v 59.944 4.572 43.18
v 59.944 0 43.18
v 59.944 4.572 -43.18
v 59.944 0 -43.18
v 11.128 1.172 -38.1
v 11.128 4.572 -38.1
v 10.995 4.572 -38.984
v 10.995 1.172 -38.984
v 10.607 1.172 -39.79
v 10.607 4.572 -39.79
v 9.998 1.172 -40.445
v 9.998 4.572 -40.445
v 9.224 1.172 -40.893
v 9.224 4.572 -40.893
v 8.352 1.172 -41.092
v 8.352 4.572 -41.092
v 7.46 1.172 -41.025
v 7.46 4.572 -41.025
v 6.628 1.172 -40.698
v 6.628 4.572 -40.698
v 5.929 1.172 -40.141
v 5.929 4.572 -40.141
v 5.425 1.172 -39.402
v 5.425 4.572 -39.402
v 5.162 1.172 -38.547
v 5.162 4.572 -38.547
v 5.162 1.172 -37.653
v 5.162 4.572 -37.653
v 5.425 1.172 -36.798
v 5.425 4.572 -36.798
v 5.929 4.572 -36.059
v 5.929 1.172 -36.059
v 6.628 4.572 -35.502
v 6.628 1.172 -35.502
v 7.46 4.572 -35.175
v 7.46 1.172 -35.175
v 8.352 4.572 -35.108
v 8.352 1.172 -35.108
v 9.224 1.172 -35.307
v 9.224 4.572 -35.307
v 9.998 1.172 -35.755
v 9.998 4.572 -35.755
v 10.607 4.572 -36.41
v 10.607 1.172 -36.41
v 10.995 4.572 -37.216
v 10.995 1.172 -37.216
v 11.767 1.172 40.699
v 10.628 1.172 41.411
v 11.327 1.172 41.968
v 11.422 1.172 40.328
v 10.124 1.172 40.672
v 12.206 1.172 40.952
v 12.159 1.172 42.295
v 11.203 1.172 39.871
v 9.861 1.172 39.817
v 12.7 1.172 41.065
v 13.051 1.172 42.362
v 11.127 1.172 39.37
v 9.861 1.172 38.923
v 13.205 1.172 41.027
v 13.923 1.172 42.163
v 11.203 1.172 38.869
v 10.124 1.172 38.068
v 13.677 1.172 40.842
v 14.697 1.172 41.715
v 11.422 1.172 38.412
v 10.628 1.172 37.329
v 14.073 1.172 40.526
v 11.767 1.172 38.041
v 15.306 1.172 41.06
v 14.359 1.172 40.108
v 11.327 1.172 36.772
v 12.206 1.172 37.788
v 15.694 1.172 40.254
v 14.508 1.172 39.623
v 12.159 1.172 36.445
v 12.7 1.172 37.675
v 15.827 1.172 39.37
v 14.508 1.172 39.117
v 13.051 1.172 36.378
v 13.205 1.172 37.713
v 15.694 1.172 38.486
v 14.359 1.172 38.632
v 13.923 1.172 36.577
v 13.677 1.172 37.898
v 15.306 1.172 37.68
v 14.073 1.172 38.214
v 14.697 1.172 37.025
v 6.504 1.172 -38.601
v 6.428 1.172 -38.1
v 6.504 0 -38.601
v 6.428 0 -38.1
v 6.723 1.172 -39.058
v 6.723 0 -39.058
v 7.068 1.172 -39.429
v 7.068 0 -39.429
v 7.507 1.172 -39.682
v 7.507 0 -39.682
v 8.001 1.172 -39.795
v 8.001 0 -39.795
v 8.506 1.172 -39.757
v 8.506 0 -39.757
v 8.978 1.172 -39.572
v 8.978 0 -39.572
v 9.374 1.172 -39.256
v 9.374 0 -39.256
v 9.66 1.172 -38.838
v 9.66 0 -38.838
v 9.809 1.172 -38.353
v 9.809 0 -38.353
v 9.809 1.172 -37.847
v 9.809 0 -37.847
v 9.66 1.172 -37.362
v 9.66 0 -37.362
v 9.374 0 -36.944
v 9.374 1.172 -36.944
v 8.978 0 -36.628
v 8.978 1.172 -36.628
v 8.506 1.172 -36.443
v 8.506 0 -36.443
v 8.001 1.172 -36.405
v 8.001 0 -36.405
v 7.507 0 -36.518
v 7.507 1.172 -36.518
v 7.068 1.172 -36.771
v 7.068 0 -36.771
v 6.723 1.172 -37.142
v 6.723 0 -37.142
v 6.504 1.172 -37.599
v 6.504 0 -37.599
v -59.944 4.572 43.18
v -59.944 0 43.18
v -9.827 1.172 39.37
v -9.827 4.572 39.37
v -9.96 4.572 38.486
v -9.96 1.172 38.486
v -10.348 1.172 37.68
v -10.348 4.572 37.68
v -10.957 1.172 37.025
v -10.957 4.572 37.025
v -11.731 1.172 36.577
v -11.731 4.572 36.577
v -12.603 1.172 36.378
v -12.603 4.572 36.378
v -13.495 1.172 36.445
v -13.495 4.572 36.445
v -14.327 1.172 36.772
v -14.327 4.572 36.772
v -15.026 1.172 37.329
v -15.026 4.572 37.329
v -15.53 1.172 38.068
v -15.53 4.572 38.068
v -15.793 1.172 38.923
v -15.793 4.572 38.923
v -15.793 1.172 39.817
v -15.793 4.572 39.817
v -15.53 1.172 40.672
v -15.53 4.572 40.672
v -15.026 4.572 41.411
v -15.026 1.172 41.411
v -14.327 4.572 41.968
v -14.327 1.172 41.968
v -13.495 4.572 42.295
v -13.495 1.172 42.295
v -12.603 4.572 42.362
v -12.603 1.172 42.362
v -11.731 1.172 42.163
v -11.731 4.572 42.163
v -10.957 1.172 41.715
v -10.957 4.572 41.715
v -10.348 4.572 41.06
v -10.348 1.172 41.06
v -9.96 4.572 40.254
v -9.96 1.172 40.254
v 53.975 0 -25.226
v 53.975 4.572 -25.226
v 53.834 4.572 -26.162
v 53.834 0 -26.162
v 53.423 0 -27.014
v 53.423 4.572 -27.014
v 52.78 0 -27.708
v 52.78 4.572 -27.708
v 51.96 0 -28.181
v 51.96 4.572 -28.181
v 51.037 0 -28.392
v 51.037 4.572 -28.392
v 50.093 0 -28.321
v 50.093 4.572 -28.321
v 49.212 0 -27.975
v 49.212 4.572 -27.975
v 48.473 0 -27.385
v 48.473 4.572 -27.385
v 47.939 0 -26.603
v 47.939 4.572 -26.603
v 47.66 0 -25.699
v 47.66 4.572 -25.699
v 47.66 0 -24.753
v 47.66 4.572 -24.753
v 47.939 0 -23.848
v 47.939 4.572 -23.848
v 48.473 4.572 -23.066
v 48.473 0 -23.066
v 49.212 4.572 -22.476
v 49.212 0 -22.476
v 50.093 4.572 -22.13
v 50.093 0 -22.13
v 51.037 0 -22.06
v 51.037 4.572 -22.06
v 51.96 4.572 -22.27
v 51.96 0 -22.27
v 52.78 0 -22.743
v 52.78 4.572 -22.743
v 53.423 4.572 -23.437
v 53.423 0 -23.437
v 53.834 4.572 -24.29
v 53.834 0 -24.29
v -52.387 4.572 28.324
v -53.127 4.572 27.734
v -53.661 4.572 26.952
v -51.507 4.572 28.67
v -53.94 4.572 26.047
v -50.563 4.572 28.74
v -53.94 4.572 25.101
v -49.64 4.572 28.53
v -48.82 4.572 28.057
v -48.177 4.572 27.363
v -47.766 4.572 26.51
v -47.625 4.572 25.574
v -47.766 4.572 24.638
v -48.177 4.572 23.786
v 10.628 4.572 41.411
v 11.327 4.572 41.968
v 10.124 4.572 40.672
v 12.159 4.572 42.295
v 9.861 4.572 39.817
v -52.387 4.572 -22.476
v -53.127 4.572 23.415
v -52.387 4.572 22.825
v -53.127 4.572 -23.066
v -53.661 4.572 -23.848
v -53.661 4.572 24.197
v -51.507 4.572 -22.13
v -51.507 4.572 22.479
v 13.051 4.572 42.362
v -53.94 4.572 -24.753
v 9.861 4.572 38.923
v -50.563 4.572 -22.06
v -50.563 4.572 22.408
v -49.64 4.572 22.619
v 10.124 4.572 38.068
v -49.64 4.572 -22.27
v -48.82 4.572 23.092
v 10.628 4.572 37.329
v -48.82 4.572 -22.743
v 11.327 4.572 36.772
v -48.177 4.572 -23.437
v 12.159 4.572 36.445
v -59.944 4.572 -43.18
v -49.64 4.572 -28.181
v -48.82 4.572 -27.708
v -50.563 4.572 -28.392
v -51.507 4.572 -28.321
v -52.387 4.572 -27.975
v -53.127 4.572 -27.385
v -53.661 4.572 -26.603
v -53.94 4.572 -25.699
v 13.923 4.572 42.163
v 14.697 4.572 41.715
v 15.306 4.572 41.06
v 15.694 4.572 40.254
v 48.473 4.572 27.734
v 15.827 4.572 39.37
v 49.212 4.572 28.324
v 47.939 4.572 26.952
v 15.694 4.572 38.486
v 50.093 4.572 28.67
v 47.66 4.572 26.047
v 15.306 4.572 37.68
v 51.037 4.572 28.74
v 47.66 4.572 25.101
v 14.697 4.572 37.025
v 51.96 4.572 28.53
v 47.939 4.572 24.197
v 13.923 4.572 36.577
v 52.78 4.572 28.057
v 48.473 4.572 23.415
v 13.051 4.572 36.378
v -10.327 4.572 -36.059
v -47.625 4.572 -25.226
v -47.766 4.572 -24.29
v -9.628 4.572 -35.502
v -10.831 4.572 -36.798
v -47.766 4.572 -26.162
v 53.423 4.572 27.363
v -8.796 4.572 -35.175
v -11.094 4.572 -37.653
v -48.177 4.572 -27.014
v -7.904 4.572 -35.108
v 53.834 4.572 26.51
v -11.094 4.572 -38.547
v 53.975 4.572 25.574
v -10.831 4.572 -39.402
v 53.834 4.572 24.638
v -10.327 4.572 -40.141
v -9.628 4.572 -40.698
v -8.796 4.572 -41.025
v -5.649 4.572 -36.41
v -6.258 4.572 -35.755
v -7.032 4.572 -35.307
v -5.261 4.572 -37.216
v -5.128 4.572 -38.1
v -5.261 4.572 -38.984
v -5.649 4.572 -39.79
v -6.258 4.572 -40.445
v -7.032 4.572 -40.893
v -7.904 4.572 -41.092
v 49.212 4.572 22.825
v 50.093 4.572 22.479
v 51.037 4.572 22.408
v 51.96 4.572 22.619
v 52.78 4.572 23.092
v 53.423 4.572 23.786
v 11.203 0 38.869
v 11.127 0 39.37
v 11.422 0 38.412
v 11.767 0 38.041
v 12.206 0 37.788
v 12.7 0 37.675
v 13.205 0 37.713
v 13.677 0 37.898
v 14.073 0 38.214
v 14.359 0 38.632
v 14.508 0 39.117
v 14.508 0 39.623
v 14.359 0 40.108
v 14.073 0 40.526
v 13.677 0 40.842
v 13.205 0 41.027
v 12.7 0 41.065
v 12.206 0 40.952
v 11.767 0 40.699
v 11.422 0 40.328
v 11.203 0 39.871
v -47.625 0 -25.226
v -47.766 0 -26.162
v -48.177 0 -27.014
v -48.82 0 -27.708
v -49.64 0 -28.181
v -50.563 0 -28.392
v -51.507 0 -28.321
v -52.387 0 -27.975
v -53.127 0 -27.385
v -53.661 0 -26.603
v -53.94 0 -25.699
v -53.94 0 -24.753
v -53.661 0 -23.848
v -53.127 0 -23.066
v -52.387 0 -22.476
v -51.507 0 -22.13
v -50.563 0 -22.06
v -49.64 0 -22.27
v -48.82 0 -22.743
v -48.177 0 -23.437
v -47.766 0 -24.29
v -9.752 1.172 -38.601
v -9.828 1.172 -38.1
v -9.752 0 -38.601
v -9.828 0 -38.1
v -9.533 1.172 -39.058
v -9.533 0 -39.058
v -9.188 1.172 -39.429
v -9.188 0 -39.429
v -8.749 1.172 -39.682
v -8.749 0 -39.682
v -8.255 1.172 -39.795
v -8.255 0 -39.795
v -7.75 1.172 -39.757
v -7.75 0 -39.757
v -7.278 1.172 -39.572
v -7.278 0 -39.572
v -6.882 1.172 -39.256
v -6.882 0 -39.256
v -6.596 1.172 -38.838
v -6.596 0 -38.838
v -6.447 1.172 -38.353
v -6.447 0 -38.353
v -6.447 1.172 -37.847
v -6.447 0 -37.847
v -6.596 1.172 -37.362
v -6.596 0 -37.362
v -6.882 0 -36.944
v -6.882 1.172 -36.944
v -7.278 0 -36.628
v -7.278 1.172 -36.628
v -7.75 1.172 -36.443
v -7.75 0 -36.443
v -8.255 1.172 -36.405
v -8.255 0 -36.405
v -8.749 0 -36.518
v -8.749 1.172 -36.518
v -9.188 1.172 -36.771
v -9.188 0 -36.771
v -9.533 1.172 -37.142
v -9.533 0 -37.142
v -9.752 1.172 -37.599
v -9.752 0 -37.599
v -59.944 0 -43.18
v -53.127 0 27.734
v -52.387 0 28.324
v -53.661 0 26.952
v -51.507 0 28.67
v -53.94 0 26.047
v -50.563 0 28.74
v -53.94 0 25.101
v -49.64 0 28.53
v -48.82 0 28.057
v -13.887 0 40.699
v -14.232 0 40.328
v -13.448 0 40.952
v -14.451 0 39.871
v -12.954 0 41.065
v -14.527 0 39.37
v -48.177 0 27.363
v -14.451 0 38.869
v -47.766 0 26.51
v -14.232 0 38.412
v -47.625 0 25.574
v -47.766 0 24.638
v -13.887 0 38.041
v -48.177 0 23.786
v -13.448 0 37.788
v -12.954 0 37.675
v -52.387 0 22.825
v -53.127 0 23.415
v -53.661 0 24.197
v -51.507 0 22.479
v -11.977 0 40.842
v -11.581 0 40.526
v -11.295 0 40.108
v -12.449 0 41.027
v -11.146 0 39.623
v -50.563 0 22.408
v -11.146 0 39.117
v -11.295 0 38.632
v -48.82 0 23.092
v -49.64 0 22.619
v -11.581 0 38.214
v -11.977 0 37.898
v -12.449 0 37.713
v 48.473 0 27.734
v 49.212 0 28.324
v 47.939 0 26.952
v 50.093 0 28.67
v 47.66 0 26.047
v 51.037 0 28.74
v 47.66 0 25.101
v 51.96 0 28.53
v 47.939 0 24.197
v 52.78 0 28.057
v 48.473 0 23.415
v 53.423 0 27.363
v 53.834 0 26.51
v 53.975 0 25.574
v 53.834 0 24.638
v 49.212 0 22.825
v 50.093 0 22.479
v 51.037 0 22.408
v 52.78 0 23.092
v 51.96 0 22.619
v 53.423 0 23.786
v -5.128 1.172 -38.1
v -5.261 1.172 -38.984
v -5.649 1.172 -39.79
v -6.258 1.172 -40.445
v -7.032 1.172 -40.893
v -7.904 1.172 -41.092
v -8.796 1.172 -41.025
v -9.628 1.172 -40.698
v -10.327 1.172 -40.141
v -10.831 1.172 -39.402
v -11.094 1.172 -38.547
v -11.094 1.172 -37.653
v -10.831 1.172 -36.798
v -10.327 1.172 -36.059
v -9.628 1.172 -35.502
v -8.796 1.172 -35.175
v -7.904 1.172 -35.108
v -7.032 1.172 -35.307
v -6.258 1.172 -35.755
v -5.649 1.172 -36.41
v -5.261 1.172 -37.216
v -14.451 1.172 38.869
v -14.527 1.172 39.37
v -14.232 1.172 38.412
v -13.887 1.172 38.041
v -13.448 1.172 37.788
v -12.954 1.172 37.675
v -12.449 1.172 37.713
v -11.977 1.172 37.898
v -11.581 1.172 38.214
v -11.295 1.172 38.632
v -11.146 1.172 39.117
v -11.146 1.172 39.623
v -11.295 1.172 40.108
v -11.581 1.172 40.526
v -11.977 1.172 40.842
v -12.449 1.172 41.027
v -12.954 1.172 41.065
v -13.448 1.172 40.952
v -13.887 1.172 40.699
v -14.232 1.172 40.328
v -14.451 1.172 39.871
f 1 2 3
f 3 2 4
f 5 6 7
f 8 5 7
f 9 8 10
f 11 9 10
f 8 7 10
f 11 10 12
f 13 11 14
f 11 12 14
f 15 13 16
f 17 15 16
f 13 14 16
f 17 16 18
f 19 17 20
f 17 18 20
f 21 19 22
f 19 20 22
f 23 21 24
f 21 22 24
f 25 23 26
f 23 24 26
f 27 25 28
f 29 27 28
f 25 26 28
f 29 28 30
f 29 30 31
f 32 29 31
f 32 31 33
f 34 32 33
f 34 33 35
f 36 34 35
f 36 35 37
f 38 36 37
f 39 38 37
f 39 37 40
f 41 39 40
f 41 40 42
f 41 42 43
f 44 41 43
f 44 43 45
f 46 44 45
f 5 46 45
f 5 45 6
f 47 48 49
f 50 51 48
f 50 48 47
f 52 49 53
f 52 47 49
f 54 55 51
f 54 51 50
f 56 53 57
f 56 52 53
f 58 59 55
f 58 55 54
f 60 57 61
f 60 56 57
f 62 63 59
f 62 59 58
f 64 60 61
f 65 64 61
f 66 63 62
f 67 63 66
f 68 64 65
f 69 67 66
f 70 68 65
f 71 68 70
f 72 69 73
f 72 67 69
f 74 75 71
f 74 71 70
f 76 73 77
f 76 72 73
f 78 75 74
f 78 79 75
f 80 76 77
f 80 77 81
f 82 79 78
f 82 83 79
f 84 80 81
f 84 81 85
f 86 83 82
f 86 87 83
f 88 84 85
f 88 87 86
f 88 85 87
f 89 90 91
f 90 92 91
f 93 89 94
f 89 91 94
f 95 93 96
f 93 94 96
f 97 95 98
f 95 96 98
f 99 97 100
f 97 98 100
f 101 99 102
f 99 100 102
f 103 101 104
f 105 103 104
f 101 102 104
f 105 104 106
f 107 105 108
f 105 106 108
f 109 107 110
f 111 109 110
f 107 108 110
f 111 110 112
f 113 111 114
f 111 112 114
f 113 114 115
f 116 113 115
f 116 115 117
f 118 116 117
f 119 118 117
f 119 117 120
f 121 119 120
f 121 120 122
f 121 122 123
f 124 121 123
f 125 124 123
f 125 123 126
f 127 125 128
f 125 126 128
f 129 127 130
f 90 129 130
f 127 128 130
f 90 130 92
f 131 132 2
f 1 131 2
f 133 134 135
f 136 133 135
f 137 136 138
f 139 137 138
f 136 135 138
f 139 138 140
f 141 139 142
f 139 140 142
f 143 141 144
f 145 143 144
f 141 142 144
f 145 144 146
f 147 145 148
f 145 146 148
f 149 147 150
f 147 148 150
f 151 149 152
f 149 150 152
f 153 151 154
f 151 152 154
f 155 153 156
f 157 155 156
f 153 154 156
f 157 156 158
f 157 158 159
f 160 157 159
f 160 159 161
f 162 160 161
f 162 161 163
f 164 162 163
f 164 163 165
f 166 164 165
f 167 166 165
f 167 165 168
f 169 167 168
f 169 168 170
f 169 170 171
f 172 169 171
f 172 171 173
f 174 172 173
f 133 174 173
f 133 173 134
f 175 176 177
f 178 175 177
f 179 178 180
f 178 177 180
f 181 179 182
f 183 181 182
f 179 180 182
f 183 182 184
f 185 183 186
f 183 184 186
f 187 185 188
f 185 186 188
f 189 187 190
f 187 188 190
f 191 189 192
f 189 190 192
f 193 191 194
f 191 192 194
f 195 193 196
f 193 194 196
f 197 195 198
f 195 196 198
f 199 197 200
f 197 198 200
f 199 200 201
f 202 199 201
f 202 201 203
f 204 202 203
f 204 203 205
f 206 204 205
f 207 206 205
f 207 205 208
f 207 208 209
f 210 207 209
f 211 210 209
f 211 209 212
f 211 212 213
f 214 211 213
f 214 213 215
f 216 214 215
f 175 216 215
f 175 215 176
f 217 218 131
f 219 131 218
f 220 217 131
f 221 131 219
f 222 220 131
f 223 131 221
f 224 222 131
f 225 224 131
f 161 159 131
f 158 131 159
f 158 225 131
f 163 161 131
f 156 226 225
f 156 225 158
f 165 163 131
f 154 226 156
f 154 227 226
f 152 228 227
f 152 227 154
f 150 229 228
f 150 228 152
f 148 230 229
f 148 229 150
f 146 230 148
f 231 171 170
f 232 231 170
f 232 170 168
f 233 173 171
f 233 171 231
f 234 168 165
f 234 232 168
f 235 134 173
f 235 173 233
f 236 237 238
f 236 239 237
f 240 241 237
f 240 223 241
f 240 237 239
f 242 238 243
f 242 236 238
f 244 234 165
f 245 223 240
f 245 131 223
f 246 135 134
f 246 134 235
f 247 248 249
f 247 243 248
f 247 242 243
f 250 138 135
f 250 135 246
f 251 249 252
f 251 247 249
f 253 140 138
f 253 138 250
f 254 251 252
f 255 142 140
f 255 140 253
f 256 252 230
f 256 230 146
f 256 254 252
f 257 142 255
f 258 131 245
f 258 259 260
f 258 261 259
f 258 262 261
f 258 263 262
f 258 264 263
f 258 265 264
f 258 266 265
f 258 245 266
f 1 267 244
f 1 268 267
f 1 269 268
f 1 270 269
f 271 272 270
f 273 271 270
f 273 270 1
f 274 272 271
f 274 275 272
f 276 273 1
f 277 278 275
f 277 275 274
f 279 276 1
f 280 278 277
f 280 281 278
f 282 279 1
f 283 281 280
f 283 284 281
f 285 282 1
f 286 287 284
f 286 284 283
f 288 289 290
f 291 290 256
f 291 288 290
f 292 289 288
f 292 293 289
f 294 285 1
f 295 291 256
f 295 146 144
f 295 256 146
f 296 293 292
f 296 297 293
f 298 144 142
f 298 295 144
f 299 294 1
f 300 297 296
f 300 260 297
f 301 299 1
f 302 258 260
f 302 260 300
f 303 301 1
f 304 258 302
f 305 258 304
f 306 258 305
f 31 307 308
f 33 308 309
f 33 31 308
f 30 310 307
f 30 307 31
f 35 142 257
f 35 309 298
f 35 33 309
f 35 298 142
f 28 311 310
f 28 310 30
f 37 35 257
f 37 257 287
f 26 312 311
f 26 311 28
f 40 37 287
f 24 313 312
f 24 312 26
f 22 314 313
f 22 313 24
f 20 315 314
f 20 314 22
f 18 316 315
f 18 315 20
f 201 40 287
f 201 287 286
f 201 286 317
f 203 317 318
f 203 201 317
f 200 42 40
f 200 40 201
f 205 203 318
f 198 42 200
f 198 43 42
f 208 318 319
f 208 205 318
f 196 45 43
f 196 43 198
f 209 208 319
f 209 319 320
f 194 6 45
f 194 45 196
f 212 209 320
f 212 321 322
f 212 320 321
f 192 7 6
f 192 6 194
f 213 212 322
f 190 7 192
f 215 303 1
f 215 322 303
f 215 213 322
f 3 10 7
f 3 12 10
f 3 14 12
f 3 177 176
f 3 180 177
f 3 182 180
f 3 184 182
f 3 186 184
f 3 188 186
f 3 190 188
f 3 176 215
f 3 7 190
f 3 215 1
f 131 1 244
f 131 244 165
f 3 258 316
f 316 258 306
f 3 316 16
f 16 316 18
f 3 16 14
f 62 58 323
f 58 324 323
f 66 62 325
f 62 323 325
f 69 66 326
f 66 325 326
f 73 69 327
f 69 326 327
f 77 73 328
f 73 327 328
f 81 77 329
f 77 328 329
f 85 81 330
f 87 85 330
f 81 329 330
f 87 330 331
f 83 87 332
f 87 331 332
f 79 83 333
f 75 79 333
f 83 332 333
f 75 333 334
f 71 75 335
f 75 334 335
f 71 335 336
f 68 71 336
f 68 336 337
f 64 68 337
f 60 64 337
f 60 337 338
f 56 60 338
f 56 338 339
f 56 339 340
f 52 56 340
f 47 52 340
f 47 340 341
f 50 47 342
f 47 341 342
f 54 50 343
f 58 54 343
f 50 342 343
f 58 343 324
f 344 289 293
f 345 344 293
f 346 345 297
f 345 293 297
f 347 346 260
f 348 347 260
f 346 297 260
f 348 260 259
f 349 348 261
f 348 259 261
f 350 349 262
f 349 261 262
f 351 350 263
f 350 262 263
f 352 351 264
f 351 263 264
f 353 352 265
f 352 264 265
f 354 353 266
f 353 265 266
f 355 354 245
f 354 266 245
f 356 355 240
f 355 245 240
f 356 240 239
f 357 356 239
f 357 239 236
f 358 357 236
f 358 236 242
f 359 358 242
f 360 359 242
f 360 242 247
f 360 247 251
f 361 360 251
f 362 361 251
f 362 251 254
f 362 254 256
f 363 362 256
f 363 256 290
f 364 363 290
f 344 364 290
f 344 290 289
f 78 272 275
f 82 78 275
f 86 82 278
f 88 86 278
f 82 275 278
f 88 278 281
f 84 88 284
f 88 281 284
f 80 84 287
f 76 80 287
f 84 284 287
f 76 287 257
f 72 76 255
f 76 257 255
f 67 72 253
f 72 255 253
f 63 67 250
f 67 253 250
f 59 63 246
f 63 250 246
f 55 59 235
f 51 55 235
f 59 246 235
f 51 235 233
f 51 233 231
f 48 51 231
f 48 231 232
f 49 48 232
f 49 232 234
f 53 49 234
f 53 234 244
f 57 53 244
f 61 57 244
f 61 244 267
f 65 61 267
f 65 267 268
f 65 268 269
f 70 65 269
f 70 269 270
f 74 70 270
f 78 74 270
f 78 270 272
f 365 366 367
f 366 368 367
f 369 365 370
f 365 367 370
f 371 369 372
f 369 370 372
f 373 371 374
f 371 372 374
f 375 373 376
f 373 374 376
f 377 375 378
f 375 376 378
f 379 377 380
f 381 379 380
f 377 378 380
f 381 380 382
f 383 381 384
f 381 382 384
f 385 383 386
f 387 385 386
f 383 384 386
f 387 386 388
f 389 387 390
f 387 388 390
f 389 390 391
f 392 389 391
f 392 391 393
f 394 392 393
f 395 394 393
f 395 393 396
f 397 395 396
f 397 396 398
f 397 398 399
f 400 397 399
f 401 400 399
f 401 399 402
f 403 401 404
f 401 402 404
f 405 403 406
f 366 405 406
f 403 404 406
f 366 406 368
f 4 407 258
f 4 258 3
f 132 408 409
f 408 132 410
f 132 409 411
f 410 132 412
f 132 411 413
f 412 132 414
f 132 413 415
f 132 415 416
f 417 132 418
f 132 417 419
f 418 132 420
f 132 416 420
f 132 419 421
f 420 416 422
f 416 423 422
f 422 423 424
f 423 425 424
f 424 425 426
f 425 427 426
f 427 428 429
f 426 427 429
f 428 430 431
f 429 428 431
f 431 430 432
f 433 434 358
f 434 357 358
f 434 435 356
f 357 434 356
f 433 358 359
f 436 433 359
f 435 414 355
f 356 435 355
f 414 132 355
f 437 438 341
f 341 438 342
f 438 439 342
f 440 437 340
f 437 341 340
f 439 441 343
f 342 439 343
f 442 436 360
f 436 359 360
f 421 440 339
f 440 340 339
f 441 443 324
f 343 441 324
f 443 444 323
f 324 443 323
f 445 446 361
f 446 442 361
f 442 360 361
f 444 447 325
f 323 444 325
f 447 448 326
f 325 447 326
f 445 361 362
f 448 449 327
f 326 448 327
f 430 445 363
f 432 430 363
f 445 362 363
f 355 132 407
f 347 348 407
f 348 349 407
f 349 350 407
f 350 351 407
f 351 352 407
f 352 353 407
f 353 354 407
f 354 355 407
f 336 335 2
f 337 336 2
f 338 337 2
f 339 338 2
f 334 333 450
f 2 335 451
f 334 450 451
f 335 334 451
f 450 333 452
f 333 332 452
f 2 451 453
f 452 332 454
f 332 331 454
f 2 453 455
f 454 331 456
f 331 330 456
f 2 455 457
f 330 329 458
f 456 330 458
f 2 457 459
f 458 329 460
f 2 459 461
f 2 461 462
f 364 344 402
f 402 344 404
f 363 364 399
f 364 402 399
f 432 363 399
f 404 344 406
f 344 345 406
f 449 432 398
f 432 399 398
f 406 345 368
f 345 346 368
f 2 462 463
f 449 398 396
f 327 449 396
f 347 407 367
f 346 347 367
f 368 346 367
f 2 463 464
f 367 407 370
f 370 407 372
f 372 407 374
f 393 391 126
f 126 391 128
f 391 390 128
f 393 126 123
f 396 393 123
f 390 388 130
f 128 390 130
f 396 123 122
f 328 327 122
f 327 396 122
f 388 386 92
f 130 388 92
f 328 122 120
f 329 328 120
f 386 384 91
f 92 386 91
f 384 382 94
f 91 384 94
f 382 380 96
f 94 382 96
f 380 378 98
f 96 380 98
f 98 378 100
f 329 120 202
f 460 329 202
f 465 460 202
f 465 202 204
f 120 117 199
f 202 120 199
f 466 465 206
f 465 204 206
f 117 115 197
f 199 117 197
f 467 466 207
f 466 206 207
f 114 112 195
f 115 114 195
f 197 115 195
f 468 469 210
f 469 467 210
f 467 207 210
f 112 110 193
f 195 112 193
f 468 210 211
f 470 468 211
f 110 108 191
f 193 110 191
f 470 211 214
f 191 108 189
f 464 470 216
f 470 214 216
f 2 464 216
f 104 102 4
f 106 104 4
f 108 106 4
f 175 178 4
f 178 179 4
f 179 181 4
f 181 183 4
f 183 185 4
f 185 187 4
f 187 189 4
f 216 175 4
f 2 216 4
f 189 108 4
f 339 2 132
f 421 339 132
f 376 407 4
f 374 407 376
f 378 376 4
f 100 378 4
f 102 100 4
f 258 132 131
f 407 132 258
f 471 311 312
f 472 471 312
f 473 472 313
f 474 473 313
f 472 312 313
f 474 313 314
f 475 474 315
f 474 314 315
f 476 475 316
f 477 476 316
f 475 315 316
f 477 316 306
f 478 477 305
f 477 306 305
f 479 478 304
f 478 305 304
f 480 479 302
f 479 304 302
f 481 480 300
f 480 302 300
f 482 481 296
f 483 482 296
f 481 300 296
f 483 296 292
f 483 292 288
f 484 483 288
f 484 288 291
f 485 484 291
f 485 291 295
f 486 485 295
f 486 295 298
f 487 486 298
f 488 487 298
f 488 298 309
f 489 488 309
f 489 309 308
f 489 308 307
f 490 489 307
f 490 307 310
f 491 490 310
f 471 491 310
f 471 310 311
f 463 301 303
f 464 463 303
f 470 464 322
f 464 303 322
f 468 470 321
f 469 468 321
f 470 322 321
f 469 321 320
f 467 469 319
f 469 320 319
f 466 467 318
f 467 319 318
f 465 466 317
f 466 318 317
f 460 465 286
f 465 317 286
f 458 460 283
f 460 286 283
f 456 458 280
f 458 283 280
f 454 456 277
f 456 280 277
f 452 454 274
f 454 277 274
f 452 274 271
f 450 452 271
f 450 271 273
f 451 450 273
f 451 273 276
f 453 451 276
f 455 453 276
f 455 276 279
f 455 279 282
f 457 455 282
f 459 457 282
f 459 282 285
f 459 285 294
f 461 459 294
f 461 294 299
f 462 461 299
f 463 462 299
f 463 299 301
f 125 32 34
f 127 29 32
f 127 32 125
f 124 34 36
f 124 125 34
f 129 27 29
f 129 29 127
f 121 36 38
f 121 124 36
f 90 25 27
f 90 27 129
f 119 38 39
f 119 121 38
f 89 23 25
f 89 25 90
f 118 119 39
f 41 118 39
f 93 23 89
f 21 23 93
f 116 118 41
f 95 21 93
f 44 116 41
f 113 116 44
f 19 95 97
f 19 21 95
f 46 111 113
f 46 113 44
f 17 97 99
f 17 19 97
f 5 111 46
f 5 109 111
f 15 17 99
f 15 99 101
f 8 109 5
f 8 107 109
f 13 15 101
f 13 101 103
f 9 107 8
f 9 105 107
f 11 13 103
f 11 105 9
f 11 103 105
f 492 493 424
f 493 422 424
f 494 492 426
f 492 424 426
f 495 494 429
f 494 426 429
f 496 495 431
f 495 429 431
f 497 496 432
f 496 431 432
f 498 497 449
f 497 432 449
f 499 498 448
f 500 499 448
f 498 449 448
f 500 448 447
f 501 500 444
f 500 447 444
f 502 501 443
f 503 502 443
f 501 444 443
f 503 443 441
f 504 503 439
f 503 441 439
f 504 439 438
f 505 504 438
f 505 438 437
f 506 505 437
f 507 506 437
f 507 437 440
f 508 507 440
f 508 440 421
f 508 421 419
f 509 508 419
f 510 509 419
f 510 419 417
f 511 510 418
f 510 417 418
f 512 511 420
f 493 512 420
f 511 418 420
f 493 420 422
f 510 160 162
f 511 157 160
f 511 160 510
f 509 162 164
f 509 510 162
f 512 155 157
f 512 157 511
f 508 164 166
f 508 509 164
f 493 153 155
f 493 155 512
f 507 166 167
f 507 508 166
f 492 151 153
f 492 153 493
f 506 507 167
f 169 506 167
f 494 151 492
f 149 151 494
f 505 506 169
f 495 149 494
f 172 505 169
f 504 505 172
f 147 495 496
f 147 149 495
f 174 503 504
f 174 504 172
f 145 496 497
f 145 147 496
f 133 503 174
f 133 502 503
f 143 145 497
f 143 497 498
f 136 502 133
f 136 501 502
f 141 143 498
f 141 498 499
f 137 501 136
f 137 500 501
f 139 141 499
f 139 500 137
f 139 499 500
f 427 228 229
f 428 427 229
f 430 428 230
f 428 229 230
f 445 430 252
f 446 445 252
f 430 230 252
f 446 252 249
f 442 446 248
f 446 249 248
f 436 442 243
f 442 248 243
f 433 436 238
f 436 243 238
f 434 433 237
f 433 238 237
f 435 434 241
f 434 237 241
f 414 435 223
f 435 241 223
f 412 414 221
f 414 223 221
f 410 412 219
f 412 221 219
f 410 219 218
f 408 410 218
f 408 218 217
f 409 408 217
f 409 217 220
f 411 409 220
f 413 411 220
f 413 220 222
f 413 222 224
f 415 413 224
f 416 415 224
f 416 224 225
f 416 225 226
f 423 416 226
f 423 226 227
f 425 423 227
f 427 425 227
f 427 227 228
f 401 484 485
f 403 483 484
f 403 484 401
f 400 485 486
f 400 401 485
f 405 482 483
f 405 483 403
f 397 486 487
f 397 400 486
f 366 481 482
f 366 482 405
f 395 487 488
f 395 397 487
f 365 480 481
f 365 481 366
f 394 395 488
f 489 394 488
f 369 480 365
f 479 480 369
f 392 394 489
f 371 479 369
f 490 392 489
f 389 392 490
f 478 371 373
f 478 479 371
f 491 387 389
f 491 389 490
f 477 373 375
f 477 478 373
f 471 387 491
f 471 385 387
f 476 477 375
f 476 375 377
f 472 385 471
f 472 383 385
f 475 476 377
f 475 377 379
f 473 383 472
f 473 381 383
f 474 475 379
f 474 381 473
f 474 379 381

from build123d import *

# Parameters (mm, degrees)
SKETCH1_W                                            = 119.888
SKETCH1_H                                            = 86.36
BOSS_EXTRUDE1_DEPTH                                  = 4.572
CBORE_FOR_M3_HEXAGON_SOCKET_HEAD_CAP_SCR_D           = 3.4
CBORE_FOR_M3_HEXAGON_SOCKET_HEAD_CAP_SCR_CBORE_D     = 6
CBORE_FOR_M3_HEXAGON_SOCKET_HEAD_CAP_SCR_CBORE_DEPTH = 3.4
SKETCH5_R                                            = 3.175
CUT_EXTRUDE1_DEPTH                                   = 5.572


with BuildPart() as part:
    # Sketch1 → Boss-Extrude1 (new body)
    with BuildSketch(Plane(origin=(0, 0, 0), x_dir=(1, 0, 0), z_dir=(0, 1, 0))):
        Rectangle(SKETCH1_W, SKETCH1_H)
    extrude(amount=BOSS_EXTRUDE1_DEPTH)

    # CBORE for M3 Hexagon socket head cap screws1 (through all)
    with Locations(Plane(origin=(0, 4.572, 0), x_dir=(1, 0, 0), z_dir=(0, 1, 0))):
        with Locations((8.128, 38.1), (12.827, -39.37), (-12.827, -39.37), (-8.128, 38.1)):
            CounterBoreHole(CBORE_FOR_M3_HEXAGON_SOCKET_HEAD_CAP_SCR_D / 2, CBORE_FOR_M3_HEXAGON_SOCKET_HEAD_CAP_SCR_CBORE_D / 2, CBORE_FOR_M3_HEXAGON_SOCKET_HEAD_CAP_SCR_CBORE_DEPTH)

    # Sketch5 → Cut-Extrude1 (cut, through all)
    with BuildSketch(Plane(origin=(0, 4.572, 0), x_dir=(1, 0, 0), z_dir=(0, 1, 0))):
        with Locations((50.8, 25.225713352)):
            Circle(SKETCH5_R)
        with Locations((50.8, -25.574286648)):
            Circle(SKETCH5_R)
        with Locations((-50.8, 25.225713352)):
            Circle(SKETCH5_R)
        with Locations((-50.8, -25.574286648)):
            Circle(SKETCH5_R)
    extrude(amount=-CUT_EXTRUDE1_DEPTH, mode=Mode.SUBTRACT)


solid = part.part
